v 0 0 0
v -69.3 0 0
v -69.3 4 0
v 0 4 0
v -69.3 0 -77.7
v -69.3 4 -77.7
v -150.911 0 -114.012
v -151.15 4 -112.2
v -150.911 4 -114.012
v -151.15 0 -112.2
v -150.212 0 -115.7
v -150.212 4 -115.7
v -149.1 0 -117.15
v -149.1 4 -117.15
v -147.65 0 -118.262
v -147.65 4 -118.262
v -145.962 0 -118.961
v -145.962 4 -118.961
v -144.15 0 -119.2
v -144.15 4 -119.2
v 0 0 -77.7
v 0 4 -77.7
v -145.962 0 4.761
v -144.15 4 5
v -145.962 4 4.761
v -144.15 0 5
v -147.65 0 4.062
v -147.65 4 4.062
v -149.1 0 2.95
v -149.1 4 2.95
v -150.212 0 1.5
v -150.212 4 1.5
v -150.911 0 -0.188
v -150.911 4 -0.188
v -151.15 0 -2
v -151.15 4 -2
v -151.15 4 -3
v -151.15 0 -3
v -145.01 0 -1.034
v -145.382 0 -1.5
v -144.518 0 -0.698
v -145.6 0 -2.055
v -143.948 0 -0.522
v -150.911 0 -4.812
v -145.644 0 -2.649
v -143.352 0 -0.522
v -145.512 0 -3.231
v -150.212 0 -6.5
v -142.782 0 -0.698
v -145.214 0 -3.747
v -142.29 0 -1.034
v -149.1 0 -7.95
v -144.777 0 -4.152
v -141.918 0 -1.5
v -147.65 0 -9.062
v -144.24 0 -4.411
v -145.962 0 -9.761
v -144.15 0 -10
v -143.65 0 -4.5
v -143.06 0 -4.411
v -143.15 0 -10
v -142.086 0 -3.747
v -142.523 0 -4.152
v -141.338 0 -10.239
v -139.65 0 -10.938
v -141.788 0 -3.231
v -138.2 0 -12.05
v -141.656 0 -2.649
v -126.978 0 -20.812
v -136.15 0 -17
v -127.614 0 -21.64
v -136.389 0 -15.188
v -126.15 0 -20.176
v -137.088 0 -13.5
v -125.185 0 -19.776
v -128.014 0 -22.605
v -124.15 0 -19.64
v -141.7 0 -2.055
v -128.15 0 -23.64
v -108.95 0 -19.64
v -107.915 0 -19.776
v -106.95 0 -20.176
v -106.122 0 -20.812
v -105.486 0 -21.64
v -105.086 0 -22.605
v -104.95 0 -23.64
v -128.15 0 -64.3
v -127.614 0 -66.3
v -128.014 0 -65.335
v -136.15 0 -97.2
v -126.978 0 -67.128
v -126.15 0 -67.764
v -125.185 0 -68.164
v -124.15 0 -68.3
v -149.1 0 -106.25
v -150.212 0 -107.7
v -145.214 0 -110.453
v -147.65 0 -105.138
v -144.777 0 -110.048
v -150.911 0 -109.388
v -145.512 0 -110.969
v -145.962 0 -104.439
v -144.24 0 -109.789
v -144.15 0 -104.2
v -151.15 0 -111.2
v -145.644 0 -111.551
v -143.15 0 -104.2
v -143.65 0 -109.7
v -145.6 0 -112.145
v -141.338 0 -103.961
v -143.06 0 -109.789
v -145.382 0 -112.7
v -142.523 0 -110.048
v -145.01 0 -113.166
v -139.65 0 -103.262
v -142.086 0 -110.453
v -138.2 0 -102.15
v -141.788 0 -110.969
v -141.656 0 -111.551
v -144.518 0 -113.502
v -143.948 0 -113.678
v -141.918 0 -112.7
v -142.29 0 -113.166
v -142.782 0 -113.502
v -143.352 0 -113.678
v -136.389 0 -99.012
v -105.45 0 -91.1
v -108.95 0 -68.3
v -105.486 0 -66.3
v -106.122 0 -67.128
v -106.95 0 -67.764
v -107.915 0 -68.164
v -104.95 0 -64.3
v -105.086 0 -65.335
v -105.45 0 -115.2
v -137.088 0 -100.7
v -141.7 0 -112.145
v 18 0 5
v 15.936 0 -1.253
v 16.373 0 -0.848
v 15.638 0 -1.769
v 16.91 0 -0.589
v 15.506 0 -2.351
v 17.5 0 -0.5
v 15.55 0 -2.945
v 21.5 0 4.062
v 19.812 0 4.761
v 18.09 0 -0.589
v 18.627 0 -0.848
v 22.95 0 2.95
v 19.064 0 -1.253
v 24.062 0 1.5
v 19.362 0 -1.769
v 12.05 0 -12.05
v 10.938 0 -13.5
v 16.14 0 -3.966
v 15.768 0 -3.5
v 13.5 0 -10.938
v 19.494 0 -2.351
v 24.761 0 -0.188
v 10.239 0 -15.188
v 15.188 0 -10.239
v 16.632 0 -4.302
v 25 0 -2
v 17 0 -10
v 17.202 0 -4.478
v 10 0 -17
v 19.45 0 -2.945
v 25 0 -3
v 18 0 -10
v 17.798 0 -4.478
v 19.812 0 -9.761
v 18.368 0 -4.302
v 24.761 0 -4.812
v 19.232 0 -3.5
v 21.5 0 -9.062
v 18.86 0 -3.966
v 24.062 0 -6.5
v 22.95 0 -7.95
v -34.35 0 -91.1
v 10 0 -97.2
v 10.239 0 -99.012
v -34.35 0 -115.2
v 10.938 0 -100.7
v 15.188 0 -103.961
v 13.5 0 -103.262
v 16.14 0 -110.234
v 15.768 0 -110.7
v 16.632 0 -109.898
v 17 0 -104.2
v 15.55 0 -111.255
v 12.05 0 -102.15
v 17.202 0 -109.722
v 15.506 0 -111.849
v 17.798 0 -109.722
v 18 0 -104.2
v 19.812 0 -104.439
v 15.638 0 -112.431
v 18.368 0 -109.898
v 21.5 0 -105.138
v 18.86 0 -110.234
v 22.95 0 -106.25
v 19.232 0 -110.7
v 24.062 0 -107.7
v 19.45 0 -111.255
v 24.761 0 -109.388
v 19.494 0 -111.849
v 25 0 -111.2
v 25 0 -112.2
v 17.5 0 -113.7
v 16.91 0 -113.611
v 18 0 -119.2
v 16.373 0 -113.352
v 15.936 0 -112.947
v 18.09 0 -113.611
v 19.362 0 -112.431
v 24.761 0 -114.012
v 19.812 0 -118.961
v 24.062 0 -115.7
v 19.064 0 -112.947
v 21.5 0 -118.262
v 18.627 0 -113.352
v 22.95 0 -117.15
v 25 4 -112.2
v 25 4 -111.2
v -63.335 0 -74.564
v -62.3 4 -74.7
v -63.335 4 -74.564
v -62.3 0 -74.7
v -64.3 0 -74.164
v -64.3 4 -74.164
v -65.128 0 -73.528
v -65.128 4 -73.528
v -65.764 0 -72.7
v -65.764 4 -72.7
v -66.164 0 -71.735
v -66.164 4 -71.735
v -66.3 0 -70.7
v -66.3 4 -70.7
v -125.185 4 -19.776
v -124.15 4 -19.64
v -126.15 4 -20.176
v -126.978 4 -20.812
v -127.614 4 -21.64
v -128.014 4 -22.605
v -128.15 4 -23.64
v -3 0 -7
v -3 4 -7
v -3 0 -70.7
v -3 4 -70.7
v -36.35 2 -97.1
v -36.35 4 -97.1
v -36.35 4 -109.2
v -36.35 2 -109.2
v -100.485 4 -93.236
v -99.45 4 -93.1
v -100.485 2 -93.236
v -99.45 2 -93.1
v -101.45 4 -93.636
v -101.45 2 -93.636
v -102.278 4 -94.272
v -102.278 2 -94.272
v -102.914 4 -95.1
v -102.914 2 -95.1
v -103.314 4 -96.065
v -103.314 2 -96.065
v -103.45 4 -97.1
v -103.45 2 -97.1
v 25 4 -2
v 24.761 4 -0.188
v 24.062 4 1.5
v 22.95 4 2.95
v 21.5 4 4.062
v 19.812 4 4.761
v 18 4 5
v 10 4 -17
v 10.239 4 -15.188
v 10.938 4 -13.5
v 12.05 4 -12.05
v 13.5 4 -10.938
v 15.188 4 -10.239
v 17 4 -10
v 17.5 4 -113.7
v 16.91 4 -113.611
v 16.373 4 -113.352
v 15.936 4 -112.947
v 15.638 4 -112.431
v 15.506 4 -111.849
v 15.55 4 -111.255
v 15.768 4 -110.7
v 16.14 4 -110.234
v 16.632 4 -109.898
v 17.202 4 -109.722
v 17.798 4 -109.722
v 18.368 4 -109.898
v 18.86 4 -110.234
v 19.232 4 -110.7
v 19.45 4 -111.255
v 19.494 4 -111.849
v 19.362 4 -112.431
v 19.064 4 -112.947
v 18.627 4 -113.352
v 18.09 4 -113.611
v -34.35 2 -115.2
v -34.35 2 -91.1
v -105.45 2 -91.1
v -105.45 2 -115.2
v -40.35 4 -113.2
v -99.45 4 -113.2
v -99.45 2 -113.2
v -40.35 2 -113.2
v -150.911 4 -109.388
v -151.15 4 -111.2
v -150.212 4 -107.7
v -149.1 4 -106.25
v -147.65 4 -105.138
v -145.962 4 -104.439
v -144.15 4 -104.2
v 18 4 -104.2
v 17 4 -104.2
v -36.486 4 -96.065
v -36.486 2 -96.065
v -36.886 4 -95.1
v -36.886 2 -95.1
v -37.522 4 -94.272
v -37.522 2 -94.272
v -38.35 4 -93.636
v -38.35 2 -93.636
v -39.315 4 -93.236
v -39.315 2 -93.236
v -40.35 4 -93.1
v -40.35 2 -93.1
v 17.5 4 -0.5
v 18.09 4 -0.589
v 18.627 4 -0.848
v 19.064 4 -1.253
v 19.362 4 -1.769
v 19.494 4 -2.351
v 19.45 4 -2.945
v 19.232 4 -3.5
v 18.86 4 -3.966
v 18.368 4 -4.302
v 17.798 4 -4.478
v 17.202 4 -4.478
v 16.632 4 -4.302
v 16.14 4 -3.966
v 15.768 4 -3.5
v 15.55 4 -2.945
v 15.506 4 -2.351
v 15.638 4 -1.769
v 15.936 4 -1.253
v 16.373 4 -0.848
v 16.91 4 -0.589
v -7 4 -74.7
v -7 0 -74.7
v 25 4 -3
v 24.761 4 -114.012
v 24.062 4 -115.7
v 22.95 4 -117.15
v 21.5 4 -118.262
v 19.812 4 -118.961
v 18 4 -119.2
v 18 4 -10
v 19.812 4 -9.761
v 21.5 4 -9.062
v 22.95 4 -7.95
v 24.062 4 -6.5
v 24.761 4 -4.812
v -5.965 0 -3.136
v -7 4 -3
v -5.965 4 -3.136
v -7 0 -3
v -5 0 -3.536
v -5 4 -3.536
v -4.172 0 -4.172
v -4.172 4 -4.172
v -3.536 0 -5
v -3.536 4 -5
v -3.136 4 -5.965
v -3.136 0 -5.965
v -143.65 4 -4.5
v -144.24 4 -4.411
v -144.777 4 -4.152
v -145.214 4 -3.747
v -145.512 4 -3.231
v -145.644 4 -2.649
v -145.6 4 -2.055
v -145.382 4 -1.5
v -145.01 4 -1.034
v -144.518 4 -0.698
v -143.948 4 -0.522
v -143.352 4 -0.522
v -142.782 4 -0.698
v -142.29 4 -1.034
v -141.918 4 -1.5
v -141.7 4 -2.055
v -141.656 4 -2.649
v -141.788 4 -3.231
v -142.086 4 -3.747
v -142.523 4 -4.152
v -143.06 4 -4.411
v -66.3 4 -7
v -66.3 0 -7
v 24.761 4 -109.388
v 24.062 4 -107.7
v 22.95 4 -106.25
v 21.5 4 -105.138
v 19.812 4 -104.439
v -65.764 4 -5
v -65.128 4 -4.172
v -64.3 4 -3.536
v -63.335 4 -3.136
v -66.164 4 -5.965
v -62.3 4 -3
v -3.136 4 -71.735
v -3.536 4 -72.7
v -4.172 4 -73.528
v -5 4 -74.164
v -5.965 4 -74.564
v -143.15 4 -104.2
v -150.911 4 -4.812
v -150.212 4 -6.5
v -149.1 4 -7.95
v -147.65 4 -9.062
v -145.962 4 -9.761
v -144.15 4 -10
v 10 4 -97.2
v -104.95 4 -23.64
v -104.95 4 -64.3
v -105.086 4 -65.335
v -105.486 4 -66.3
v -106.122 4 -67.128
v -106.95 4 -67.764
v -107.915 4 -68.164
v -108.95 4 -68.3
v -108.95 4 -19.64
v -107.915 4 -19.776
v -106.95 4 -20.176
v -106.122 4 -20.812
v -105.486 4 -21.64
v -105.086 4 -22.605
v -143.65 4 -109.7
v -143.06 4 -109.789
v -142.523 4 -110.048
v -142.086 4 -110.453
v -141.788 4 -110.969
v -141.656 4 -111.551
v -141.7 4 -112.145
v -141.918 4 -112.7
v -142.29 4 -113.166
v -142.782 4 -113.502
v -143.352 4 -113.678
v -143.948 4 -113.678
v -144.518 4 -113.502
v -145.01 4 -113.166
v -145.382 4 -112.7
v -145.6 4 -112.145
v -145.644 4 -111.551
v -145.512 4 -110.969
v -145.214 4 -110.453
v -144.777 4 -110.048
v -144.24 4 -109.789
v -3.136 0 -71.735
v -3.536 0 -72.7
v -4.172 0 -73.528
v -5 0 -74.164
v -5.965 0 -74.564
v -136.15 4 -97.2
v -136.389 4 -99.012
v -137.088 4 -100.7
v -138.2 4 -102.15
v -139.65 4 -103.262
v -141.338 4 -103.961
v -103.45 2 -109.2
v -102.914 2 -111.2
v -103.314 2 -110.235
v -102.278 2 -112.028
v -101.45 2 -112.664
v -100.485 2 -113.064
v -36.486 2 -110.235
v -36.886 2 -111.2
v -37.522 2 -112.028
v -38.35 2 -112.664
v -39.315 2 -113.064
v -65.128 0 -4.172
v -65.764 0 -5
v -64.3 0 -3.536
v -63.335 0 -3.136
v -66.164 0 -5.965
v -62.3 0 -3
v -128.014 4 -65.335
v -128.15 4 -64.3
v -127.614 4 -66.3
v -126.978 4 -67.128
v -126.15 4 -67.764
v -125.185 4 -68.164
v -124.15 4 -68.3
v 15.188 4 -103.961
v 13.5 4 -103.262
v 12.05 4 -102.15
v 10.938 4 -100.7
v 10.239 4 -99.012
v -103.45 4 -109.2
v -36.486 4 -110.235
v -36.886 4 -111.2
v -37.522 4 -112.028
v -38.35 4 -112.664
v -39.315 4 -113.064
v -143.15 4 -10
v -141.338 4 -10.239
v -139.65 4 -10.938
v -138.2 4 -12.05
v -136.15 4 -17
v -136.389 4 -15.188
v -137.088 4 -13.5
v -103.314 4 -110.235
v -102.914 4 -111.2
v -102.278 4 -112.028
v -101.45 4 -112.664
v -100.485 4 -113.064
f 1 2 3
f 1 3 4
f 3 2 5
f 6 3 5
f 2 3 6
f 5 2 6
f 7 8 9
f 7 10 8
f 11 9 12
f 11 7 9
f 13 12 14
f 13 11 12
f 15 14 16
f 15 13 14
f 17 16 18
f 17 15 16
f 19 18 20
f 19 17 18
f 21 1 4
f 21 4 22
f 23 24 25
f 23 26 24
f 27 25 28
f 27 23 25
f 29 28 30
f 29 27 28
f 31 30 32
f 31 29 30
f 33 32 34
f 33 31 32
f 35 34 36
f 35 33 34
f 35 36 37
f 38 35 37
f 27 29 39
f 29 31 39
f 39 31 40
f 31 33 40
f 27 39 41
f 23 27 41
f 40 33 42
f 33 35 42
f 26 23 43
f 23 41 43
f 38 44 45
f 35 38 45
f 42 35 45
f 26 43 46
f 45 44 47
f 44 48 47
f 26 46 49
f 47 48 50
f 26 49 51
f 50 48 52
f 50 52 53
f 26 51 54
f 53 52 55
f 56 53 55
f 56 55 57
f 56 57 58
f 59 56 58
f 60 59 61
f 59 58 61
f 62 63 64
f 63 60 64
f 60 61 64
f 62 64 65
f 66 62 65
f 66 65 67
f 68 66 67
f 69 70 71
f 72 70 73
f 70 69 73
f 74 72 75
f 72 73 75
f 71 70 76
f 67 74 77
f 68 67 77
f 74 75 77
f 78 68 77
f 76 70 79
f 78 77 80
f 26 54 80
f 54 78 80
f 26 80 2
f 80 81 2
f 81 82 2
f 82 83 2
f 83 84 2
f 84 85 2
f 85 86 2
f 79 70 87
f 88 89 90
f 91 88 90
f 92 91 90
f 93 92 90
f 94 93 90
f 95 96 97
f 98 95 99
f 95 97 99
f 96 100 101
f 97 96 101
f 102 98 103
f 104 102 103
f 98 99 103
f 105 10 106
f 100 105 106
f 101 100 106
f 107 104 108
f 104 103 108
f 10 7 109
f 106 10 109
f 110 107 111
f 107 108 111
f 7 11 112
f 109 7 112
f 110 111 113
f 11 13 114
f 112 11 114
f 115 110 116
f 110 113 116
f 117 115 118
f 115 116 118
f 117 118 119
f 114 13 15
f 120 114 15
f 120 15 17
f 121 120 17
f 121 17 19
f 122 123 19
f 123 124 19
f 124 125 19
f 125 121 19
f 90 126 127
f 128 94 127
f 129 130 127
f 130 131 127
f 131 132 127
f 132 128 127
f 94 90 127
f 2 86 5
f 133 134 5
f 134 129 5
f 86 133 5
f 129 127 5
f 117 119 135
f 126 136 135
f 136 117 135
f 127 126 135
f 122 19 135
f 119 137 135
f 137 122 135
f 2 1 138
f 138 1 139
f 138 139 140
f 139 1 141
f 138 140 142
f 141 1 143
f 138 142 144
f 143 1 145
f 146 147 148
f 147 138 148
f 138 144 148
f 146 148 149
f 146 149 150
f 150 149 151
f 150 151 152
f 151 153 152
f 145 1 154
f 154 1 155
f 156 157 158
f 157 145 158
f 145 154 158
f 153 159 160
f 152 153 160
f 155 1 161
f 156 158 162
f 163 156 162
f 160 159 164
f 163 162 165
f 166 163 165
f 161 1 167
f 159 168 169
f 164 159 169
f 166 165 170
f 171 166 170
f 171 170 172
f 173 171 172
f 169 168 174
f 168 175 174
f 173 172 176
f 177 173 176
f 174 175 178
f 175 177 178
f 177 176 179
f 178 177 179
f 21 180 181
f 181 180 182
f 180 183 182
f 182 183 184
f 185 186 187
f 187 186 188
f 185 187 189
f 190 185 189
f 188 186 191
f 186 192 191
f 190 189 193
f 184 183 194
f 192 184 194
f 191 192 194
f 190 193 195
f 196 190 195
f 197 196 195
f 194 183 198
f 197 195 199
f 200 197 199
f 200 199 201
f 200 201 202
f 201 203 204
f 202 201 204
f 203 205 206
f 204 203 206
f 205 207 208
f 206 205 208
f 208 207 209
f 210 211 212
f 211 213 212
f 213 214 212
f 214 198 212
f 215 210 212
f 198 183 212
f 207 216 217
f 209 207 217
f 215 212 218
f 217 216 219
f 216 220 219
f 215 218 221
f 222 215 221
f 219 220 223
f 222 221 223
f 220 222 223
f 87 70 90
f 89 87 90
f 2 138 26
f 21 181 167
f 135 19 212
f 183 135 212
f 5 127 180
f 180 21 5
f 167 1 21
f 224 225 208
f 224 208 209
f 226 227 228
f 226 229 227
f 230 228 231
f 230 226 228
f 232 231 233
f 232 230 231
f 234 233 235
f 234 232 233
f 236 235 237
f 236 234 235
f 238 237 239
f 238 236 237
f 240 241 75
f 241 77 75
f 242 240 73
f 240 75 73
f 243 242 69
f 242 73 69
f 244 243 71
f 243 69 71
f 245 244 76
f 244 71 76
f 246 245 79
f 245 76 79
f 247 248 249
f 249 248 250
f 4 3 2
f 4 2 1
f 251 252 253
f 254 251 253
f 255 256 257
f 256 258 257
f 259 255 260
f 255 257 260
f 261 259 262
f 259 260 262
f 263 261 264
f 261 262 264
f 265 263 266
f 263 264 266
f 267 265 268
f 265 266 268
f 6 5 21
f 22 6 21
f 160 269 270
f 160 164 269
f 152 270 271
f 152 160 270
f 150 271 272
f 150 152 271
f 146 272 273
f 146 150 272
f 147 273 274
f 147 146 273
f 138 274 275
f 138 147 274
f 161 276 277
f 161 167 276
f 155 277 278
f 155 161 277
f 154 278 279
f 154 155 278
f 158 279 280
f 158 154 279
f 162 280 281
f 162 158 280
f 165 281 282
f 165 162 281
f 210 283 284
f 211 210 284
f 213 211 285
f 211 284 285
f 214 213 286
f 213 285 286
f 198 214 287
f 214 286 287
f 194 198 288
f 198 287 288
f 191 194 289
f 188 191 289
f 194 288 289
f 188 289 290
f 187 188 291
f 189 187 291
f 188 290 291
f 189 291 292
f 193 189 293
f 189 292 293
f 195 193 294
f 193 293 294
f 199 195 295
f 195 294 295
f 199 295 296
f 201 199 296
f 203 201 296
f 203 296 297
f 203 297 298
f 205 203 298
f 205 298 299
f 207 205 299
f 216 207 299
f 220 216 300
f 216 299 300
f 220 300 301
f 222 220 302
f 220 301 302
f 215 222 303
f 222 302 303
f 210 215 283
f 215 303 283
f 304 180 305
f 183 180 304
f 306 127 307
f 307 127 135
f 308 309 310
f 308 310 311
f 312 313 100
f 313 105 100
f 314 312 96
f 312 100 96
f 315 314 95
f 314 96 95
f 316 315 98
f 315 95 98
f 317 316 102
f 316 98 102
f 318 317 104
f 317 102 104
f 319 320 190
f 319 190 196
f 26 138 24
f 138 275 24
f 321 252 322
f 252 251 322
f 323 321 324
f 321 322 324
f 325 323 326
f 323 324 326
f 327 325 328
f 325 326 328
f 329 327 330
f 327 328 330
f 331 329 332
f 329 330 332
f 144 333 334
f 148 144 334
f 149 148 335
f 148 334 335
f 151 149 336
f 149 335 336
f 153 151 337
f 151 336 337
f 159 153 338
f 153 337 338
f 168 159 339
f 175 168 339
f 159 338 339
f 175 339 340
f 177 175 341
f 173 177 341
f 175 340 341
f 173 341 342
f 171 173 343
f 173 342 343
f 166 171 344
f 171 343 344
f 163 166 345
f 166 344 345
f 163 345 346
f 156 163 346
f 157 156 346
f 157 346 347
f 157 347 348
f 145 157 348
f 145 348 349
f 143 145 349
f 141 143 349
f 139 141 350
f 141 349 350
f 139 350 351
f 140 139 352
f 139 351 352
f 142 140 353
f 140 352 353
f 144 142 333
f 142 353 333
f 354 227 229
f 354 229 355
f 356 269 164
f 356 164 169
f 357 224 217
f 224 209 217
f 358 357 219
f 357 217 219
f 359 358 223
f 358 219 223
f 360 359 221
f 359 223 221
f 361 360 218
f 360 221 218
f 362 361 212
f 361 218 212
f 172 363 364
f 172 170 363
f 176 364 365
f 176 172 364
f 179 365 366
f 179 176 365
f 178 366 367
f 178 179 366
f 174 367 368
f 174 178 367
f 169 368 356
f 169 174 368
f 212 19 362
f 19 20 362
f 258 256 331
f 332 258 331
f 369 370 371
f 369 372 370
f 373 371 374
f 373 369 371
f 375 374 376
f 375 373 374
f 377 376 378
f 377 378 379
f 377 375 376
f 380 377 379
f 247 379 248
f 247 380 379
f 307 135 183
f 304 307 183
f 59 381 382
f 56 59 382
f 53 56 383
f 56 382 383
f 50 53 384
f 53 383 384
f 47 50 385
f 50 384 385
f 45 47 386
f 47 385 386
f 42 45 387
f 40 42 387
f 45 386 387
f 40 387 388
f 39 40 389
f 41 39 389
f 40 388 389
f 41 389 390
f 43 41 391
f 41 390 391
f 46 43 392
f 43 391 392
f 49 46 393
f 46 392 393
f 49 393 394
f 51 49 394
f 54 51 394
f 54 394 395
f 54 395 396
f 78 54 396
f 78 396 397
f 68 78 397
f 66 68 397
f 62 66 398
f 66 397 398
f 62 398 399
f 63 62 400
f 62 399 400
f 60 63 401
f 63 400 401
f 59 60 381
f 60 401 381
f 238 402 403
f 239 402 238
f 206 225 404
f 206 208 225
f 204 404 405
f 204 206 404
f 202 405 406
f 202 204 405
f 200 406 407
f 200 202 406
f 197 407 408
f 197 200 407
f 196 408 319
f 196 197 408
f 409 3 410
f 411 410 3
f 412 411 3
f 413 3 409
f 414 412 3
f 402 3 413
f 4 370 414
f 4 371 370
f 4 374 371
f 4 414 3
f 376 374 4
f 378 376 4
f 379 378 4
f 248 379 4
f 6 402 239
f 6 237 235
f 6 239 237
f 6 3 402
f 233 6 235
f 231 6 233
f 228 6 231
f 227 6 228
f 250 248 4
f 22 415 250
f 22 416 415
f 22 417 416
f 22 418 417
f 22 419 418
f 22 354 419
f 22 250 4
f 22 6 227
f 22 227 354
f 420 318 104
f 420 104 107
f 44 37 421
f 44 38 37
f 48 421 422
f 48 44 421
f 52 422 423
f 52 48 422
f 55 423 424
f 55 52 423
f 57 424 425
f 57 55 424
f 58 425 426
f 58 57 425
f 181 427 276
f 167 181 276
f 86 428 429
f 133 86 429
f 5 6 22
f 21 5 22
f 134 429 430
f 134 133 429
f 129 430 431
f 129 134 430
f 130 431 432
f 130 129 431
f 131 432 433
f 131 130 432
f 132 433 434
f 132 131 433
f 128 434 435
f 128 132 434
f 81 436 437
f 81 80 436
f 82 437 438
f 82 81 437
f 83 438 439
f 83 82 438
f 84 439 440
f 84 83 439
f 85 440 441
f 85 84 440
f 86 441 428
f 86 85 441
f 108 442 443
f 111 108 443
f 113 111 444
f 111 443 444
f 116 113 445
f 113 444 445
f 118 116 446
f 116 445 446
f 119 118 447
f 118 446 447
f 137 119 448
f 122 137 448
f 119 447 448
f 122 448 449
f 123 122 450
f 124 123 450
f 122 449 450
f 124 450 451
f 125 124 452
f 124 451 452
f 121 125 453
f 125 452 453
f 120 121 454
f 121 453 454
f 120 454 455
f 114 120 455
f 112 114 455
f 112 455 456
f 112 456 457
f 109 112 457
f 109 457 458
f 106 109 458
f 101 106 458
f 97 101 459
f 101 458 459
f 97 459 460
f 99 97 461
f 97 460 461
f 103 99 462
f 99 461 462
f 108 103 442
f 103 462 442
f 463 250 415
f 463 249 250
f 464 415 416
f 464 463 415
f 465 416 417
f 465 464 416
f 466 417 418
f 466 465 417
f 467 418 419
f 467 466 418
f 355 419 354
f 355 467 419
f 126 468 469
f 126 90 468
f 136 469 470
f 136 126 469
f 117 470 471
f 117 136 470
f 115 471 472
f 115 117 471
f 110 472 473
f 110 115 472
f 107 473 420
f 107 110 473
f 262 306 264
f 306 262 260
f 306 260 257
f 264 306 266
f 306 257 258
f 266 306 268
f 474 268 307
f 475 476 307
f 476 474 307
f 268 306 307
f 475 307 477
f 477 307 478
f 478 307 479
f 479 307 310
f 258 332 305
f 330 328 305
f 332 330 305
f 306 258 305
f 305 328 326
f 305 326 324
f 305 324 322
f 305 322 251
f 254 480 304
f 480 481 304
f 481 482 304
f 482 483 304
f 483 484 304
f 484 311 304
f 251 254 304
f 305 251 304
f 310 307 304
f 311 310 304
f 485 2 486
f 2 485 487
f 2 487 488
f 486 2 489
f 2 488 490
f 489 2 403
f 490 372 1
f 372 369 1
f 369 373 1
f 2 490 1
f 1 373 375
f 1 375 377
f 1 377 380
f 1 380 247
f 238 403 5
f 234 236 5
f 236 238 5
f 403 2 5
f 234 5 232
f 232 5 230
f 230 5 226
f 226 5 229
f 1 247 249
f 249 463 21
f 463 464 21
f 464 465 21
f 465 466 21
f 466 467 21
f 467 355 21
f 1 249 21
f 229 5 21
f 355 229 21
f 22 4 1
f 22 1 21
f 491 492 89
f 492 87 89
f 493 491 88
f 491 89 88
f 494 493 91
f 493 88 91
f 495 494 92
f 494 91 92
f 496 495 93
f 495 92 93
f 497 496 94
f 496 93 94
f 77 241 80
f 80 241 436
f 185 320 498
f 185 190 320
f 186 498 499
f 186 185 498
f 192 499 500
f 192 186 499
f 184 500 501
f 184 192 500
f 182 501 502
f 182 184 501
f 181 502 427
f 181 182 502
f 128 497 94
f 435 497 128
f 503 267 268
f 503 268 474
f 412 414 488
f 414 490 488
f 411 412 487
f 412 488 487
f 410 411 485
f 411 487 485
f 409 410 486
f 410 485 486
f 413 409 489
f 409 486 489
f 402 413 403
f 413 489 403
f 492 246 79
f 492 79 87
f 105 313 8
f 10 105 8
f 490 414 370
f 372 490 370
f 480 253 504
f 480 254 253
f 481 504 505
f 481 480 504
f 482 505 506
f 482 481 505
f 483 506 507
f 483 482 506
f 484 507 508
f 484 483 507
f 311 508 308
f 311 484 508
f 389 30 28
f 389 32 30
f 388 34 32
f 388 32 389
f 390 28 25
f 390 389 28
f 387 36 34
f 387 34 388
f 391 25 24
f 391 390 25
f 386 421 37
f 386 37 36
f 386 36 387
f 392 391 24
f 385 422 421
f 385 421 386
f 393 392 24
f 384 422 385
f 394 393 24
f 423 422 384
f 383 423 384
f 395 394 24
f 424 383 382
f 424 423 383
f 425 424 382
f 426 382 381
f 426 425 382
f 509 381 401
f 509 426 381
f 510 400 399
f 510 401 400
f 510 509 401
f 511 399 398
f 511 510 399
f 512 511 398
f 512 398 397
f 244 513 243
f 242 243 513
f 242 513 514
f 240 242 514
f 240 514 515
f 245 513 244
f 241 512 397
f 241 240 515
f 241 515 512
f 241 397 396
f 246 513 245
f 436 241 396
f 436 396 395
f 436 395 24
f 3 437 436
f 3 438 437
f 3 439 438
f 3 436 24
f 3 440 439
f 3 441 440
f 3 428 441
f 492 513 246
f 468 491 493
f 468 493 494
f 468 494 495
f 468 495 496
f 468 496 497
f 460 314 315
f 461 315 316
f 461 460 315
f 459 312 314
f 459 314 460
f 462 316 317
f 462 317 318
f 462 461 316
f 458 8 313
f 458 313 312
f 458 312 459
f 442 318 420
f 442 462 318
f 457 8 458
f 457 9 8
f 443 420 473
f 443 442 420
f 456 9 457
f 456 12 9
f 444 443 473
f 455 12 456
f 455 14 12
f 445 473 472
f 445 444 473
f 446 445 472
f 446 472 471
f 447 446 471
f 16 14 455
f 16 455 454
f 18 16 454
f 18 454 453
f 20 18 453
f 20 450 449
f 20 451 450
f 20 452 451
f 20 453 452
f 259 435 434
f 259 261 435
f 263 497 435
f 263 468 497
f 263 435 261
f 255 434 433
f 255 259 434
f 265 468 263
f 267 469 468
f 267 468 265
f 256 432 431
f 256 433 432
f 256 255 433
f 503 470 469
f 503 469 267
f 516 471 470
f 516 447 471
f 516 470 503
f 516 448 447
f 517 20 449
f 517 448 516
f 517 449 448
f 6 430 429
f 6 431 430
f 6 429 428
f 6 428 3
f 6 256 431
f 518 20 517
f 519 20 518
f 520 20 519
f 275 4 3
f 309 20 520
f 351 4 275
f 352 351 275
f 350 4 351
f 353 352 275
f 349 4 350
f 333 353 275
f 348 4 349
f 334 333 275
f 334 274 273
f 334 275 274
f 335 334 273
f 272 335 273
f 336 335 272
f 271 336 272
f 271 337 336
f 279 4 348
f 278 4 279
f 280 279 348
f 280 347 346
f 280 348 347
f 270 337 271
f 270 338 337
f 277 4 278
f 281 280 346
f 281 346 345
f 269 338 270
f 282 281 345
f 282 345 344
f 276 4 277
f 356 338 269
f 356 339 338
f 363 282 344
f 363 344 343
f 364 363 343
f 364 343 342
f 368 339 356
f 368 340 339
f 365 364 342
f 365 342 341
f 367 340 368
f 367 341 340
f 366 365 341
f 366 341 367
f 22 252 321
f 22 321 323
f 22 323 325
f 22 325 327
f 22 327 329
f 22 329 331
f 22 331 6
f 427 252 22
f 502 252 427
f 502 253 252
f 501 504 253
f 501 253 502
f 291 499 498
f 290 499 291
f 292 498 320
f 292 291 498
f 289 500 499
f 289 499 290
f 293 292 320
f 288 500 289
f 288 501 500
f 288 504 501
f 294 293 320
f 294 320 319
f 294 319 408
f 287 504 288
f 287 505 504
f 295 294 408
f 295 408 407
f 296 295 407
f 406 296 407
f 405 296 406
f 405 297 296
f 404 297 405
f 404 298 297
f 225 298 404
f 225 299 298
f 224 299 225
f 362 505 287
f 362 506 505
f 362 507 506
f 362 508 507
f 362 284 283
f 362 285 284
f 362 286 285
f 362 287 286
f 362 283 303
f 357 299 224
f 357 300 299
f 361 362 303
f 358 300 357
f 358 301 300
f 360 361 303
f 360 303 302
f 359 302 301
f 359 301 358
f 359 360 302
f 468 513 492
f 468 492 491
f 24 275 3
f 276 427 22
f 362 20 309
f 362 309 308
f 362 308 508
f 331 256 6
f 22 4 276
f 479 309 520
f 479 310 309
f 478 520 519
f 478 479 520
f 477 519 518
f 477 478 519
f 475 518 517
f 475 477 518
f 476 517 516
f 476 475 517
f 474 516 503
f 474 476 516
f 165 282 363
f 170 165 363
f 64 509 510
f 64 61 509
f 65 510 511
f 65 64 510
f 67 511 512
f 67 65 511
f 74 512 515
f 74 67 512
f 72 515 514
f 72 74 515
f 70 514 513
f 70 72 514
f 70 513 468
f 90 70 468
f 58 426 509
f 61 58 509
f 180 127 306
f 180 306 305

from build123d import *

# Parameters (mm, degrees)
SKETCH1_W               = 164.15
SKETCH1_H               = 135.2
SKETCH1_W_2             = 69.3
SKETCH1_H_2             = 77.7
SKETCH1_W_3             = 71.1
SKETCH1_H_3             = 24.1
SKETCH1_W_4             = 15.2
SKETCH1_H_4             = 40.66
BOSS_EXTRUDE1_DEPTH     = 4
SKETCH3_W               = 75.1
SKETCH3_H               = 28.1
SKETCH3_W_2             = 67.1
SKETCH3_H_2             = 20.1
EXTRUDE_THIN1_DEPTH     = 2
SKETCH4_W               = 23.2
SKETCH4_H               = 48.66
SKETCH4_W_2             = 15.2
SKETCH4_H_2             = 40.66
CUT_EXTRUDE_THIN1_DEPTH = 10
CUT_EXTRUDE4_DEPTH      = 4
FILLET3_R               = 4
SKETCH9_W               = 15
SKETCH9_H               = 15
SKETCH9_R               = 2
BOSS_EXTRUDE5_DEPTH     = 4
FILLET4_R               = 7
SKETCH10_W              = 69.3
SKETCH10_H              = 77.7
SKETCH10_W_2            = 63.3
SKETCH10_H_2            = 71.7
EXTRUDE_THIN2_DEPTH     = 4
FILLET5_R               = 4


with BuildPart() as part:
    # Sketch1 → Boss-Extrude1 (new body)
    with BuildSketch(Plane(origin=(0, 0, 0), x_dir=(1, 0, 0), z_dir=(0, 1, 0))):
        with Locations((-62.075, 57.6)):
            Rectangle(SKETCH1_W, SKETCH1_H)
        with Locations((-34.65, 38.85)):
            Rectangle(SKETCH1_W_2, SKETCH1_H_2, mode=Mode.SUBTRACT)
        with Locations((-69.9, 103.15)):
            Rectangle(SKETCH1_W_3, SKETCH1_H_3, mode=Mode.SUBTRACT)
        with Locations((-116.55, 43.97)):
            Rectangle(SKETCH1_W_4, SKETCH1_H_4, mode=Mode.SUBTRACT)
    extrude(amount=BOSS_EXTRUDE1_DEPTH)

    # Sketch3 → Extrude-Thin1 (add)
    with BuildSketch(Plane(origin=(0, 4, 0), x_dir=(1, 0, 0), z_dir=(0, 1, 0))):
        with Locations((-69.9, 103.15)):
            Rectangle(SKETCH3_W, SKETCH3_H)
        with Locations((-69.9, 103.15)):
            Rectangle(SKETCH3_W_2, SKETCH3_H_2, mode=Mode.SUBTRACT)
    extrude(amount=-EXTRUDE_THIN1_DEPTH)

    # Sketch4 → Cut-Extrude-Thin1 (cut)
    with BuildSketch(Plane(origin=(0, 4, 0), x_dir=(1, 0, 0), z_dir=(0, 1, 0))):
        with Locations((-116.55, 43.97)):
            Rectangle(SKETCH4_W, SKETCH4_H)
        with Locations((-116.55, 43.97)):
            Rectangle(SKETCH4_W_2, SKETCH4_H_2, mode=Mode.SUBTRACT)
    extrude(amount=-CUT_EXTRUDE_THIN1_DEPTH, mode=Mode.SUBTRACT)

    # Sketch8 → Cut-Extrude4 (cut)
    with BuildSketch(Plane(origin=(0, 4, 0), x_dir=(1, 0, 0), z_dir=(0, 1, 0))):
        Polygon((-136.15, 119.2), (-144.15, 119.2), (-144.15, -5), (-136.15, -5), (-136.15, 68.3), align=None)
        Polygon((20, -5), (20, 119.2), (10, 119.2), (10, 77.7), (10, -5), align=None)
        Polygon((-136.15, -5), (-144.15, -5), (-144.15, -10), (20, -10), (20, -5), (10, -5), align=None)
        Polygon((20, 125.2), (-144.15, 125.2), (-144.15, 119.2), (-136.15, 119.2), (10, 119.2), (20, 119.2), align=None)
    extrude(amount=-CUT_EXTRUDE4_DEPTH, mode=Mode.SUBTRACT)

    # Fillet3
    fillet3_edges = [part.edges().sort_by_distance(p)[0] for p in [
        (-103.45, 3, -113.2),
        (-36.35, 3, -113.2),
        (-36.35, 3, -93.1),
        (-103.45, 3, -93.1),
        (-128.15, 2, -19.64),
        (-128.15, 2, -68.3),
        (-104.95, 2, -68.3),
        (-104.95, 2, -19.64),
    ]]
    fillet(fillet3_edges, radius=FILLET3_R)

    # Sketch9 → Boss-Extrude5 (add)
    # profile 1 of 4: a face of its own
    with BuildSketch(Plane(origin=(0, 4, 0), x_dir=(1, 0, 0), z_dir=(0, 1, 0))):
        with Locations((-143.65, 111.7)):
            Rectangle(SKETCH9_W, SKETCH9_H)
        with Locations(Location((-143.65, 111.7, 0), (0, 0, 270))):
            Circle(SKETCH9_R, mode=Mode.SUBTRACT)
    # profile 2 of 4: a face of its own
    with BuildSketch(Plane(origin=(0, 4, 0), x_dir=(1, 0, 0), z_dir=(0, 1, 0))):
        with Locations((17.5, 111.7)):
            Rectangle(SKETCH9_W, SKETCH9_H)
        with Locations(Location((17.5, 111.7, 0), (0, 0, 90))):
            Circle(SKETCH9_R, mode=Mode.SUBTRACT)
    # profile 3 of 4: a face of its own
    with BuildSketch(Plane(origin=(0, 4, 0), x_dir=(1, 0, 0), z_dir=(0, 1, 0))):
        with Locations((17.5, 2.5)):
            Rectangle(SKETCH9_W, SKETCH9_H)
        with Locations(Location((17.5, 2.5, 0), (0, 0, 270))):
            Circle(SKETCH9_R, mode=Mode.SUBTRACT)
    # profile 4 of 4: a face of its own
    with BuildSketch(Plane(origin=(0, 4, 0), x_dir=(1, 0, 0), z_dir=(0, 1, 0))):
        with Locations((-143.65, 2.5)):
            Rectangle(SKETCH9_W, SKETCH9_H)
        with Locations(Location((-143.65, 2.5, 0), (0, 0, 90))):
            Circle(SKETCH9_R, mode=Mode.SUBTRACT)
    extrude(amount=-BOSS_EXTRUDE5_DEPTH)

    # Fillet4
    fillet4_edges = [part.edges().sort_by_distance(p)[0] for p in [
        (-136.15, 2, -104.2),
        (-151.15, 2, -104.2),
        (-151.15, 2, -119.2),
        (25, 2, -119.2),
        (25, 2, -104.2),
        (10, 2, -104.2),
        (10, 2, -10),
        (25, 2, -10),
        (25, 2, 5),
        (-151.15, 2, 5),
        (-151.15, 2, -10),
        (-136.15, 2, -10),
    ]]
    fillet(fillet4_edges, radius=FILLET4_R)


with BuildPart() as body_2:
    # Sketch10 → Extrude-Thin2 (new body)
    with BuildSketch(Plane(origin=(0, 4, 0), x_dir=(1, 0, 0), z_dir=(0, 1, 0))):
        with Locations((-34.65, 38.85)):
            Rectangle(SKETCH10_W, SKETCH10_H)
        with Locations((-34.65, 38.85)):
            Rectangle(SKETCH10_W_2, SKETCH10_H_2, mode=Mode.SUBTRACT)
    extrude(amount=-EXTRUDE_THIN2_DEPTH)

    # Fillet5
    fillet5_edges = [body_2.edges().sort_by_distance(p)[0] for p in [
        (-66.3, 2, -3),
        (-66.3, 2, -74.7),
        (-3, 2, -74.7),
        (-3, 2, -3),
    ]]
    fillet(fillet5_edges, radius=FILLET5_R)


solid = Compound([part.part, body_2.part])
